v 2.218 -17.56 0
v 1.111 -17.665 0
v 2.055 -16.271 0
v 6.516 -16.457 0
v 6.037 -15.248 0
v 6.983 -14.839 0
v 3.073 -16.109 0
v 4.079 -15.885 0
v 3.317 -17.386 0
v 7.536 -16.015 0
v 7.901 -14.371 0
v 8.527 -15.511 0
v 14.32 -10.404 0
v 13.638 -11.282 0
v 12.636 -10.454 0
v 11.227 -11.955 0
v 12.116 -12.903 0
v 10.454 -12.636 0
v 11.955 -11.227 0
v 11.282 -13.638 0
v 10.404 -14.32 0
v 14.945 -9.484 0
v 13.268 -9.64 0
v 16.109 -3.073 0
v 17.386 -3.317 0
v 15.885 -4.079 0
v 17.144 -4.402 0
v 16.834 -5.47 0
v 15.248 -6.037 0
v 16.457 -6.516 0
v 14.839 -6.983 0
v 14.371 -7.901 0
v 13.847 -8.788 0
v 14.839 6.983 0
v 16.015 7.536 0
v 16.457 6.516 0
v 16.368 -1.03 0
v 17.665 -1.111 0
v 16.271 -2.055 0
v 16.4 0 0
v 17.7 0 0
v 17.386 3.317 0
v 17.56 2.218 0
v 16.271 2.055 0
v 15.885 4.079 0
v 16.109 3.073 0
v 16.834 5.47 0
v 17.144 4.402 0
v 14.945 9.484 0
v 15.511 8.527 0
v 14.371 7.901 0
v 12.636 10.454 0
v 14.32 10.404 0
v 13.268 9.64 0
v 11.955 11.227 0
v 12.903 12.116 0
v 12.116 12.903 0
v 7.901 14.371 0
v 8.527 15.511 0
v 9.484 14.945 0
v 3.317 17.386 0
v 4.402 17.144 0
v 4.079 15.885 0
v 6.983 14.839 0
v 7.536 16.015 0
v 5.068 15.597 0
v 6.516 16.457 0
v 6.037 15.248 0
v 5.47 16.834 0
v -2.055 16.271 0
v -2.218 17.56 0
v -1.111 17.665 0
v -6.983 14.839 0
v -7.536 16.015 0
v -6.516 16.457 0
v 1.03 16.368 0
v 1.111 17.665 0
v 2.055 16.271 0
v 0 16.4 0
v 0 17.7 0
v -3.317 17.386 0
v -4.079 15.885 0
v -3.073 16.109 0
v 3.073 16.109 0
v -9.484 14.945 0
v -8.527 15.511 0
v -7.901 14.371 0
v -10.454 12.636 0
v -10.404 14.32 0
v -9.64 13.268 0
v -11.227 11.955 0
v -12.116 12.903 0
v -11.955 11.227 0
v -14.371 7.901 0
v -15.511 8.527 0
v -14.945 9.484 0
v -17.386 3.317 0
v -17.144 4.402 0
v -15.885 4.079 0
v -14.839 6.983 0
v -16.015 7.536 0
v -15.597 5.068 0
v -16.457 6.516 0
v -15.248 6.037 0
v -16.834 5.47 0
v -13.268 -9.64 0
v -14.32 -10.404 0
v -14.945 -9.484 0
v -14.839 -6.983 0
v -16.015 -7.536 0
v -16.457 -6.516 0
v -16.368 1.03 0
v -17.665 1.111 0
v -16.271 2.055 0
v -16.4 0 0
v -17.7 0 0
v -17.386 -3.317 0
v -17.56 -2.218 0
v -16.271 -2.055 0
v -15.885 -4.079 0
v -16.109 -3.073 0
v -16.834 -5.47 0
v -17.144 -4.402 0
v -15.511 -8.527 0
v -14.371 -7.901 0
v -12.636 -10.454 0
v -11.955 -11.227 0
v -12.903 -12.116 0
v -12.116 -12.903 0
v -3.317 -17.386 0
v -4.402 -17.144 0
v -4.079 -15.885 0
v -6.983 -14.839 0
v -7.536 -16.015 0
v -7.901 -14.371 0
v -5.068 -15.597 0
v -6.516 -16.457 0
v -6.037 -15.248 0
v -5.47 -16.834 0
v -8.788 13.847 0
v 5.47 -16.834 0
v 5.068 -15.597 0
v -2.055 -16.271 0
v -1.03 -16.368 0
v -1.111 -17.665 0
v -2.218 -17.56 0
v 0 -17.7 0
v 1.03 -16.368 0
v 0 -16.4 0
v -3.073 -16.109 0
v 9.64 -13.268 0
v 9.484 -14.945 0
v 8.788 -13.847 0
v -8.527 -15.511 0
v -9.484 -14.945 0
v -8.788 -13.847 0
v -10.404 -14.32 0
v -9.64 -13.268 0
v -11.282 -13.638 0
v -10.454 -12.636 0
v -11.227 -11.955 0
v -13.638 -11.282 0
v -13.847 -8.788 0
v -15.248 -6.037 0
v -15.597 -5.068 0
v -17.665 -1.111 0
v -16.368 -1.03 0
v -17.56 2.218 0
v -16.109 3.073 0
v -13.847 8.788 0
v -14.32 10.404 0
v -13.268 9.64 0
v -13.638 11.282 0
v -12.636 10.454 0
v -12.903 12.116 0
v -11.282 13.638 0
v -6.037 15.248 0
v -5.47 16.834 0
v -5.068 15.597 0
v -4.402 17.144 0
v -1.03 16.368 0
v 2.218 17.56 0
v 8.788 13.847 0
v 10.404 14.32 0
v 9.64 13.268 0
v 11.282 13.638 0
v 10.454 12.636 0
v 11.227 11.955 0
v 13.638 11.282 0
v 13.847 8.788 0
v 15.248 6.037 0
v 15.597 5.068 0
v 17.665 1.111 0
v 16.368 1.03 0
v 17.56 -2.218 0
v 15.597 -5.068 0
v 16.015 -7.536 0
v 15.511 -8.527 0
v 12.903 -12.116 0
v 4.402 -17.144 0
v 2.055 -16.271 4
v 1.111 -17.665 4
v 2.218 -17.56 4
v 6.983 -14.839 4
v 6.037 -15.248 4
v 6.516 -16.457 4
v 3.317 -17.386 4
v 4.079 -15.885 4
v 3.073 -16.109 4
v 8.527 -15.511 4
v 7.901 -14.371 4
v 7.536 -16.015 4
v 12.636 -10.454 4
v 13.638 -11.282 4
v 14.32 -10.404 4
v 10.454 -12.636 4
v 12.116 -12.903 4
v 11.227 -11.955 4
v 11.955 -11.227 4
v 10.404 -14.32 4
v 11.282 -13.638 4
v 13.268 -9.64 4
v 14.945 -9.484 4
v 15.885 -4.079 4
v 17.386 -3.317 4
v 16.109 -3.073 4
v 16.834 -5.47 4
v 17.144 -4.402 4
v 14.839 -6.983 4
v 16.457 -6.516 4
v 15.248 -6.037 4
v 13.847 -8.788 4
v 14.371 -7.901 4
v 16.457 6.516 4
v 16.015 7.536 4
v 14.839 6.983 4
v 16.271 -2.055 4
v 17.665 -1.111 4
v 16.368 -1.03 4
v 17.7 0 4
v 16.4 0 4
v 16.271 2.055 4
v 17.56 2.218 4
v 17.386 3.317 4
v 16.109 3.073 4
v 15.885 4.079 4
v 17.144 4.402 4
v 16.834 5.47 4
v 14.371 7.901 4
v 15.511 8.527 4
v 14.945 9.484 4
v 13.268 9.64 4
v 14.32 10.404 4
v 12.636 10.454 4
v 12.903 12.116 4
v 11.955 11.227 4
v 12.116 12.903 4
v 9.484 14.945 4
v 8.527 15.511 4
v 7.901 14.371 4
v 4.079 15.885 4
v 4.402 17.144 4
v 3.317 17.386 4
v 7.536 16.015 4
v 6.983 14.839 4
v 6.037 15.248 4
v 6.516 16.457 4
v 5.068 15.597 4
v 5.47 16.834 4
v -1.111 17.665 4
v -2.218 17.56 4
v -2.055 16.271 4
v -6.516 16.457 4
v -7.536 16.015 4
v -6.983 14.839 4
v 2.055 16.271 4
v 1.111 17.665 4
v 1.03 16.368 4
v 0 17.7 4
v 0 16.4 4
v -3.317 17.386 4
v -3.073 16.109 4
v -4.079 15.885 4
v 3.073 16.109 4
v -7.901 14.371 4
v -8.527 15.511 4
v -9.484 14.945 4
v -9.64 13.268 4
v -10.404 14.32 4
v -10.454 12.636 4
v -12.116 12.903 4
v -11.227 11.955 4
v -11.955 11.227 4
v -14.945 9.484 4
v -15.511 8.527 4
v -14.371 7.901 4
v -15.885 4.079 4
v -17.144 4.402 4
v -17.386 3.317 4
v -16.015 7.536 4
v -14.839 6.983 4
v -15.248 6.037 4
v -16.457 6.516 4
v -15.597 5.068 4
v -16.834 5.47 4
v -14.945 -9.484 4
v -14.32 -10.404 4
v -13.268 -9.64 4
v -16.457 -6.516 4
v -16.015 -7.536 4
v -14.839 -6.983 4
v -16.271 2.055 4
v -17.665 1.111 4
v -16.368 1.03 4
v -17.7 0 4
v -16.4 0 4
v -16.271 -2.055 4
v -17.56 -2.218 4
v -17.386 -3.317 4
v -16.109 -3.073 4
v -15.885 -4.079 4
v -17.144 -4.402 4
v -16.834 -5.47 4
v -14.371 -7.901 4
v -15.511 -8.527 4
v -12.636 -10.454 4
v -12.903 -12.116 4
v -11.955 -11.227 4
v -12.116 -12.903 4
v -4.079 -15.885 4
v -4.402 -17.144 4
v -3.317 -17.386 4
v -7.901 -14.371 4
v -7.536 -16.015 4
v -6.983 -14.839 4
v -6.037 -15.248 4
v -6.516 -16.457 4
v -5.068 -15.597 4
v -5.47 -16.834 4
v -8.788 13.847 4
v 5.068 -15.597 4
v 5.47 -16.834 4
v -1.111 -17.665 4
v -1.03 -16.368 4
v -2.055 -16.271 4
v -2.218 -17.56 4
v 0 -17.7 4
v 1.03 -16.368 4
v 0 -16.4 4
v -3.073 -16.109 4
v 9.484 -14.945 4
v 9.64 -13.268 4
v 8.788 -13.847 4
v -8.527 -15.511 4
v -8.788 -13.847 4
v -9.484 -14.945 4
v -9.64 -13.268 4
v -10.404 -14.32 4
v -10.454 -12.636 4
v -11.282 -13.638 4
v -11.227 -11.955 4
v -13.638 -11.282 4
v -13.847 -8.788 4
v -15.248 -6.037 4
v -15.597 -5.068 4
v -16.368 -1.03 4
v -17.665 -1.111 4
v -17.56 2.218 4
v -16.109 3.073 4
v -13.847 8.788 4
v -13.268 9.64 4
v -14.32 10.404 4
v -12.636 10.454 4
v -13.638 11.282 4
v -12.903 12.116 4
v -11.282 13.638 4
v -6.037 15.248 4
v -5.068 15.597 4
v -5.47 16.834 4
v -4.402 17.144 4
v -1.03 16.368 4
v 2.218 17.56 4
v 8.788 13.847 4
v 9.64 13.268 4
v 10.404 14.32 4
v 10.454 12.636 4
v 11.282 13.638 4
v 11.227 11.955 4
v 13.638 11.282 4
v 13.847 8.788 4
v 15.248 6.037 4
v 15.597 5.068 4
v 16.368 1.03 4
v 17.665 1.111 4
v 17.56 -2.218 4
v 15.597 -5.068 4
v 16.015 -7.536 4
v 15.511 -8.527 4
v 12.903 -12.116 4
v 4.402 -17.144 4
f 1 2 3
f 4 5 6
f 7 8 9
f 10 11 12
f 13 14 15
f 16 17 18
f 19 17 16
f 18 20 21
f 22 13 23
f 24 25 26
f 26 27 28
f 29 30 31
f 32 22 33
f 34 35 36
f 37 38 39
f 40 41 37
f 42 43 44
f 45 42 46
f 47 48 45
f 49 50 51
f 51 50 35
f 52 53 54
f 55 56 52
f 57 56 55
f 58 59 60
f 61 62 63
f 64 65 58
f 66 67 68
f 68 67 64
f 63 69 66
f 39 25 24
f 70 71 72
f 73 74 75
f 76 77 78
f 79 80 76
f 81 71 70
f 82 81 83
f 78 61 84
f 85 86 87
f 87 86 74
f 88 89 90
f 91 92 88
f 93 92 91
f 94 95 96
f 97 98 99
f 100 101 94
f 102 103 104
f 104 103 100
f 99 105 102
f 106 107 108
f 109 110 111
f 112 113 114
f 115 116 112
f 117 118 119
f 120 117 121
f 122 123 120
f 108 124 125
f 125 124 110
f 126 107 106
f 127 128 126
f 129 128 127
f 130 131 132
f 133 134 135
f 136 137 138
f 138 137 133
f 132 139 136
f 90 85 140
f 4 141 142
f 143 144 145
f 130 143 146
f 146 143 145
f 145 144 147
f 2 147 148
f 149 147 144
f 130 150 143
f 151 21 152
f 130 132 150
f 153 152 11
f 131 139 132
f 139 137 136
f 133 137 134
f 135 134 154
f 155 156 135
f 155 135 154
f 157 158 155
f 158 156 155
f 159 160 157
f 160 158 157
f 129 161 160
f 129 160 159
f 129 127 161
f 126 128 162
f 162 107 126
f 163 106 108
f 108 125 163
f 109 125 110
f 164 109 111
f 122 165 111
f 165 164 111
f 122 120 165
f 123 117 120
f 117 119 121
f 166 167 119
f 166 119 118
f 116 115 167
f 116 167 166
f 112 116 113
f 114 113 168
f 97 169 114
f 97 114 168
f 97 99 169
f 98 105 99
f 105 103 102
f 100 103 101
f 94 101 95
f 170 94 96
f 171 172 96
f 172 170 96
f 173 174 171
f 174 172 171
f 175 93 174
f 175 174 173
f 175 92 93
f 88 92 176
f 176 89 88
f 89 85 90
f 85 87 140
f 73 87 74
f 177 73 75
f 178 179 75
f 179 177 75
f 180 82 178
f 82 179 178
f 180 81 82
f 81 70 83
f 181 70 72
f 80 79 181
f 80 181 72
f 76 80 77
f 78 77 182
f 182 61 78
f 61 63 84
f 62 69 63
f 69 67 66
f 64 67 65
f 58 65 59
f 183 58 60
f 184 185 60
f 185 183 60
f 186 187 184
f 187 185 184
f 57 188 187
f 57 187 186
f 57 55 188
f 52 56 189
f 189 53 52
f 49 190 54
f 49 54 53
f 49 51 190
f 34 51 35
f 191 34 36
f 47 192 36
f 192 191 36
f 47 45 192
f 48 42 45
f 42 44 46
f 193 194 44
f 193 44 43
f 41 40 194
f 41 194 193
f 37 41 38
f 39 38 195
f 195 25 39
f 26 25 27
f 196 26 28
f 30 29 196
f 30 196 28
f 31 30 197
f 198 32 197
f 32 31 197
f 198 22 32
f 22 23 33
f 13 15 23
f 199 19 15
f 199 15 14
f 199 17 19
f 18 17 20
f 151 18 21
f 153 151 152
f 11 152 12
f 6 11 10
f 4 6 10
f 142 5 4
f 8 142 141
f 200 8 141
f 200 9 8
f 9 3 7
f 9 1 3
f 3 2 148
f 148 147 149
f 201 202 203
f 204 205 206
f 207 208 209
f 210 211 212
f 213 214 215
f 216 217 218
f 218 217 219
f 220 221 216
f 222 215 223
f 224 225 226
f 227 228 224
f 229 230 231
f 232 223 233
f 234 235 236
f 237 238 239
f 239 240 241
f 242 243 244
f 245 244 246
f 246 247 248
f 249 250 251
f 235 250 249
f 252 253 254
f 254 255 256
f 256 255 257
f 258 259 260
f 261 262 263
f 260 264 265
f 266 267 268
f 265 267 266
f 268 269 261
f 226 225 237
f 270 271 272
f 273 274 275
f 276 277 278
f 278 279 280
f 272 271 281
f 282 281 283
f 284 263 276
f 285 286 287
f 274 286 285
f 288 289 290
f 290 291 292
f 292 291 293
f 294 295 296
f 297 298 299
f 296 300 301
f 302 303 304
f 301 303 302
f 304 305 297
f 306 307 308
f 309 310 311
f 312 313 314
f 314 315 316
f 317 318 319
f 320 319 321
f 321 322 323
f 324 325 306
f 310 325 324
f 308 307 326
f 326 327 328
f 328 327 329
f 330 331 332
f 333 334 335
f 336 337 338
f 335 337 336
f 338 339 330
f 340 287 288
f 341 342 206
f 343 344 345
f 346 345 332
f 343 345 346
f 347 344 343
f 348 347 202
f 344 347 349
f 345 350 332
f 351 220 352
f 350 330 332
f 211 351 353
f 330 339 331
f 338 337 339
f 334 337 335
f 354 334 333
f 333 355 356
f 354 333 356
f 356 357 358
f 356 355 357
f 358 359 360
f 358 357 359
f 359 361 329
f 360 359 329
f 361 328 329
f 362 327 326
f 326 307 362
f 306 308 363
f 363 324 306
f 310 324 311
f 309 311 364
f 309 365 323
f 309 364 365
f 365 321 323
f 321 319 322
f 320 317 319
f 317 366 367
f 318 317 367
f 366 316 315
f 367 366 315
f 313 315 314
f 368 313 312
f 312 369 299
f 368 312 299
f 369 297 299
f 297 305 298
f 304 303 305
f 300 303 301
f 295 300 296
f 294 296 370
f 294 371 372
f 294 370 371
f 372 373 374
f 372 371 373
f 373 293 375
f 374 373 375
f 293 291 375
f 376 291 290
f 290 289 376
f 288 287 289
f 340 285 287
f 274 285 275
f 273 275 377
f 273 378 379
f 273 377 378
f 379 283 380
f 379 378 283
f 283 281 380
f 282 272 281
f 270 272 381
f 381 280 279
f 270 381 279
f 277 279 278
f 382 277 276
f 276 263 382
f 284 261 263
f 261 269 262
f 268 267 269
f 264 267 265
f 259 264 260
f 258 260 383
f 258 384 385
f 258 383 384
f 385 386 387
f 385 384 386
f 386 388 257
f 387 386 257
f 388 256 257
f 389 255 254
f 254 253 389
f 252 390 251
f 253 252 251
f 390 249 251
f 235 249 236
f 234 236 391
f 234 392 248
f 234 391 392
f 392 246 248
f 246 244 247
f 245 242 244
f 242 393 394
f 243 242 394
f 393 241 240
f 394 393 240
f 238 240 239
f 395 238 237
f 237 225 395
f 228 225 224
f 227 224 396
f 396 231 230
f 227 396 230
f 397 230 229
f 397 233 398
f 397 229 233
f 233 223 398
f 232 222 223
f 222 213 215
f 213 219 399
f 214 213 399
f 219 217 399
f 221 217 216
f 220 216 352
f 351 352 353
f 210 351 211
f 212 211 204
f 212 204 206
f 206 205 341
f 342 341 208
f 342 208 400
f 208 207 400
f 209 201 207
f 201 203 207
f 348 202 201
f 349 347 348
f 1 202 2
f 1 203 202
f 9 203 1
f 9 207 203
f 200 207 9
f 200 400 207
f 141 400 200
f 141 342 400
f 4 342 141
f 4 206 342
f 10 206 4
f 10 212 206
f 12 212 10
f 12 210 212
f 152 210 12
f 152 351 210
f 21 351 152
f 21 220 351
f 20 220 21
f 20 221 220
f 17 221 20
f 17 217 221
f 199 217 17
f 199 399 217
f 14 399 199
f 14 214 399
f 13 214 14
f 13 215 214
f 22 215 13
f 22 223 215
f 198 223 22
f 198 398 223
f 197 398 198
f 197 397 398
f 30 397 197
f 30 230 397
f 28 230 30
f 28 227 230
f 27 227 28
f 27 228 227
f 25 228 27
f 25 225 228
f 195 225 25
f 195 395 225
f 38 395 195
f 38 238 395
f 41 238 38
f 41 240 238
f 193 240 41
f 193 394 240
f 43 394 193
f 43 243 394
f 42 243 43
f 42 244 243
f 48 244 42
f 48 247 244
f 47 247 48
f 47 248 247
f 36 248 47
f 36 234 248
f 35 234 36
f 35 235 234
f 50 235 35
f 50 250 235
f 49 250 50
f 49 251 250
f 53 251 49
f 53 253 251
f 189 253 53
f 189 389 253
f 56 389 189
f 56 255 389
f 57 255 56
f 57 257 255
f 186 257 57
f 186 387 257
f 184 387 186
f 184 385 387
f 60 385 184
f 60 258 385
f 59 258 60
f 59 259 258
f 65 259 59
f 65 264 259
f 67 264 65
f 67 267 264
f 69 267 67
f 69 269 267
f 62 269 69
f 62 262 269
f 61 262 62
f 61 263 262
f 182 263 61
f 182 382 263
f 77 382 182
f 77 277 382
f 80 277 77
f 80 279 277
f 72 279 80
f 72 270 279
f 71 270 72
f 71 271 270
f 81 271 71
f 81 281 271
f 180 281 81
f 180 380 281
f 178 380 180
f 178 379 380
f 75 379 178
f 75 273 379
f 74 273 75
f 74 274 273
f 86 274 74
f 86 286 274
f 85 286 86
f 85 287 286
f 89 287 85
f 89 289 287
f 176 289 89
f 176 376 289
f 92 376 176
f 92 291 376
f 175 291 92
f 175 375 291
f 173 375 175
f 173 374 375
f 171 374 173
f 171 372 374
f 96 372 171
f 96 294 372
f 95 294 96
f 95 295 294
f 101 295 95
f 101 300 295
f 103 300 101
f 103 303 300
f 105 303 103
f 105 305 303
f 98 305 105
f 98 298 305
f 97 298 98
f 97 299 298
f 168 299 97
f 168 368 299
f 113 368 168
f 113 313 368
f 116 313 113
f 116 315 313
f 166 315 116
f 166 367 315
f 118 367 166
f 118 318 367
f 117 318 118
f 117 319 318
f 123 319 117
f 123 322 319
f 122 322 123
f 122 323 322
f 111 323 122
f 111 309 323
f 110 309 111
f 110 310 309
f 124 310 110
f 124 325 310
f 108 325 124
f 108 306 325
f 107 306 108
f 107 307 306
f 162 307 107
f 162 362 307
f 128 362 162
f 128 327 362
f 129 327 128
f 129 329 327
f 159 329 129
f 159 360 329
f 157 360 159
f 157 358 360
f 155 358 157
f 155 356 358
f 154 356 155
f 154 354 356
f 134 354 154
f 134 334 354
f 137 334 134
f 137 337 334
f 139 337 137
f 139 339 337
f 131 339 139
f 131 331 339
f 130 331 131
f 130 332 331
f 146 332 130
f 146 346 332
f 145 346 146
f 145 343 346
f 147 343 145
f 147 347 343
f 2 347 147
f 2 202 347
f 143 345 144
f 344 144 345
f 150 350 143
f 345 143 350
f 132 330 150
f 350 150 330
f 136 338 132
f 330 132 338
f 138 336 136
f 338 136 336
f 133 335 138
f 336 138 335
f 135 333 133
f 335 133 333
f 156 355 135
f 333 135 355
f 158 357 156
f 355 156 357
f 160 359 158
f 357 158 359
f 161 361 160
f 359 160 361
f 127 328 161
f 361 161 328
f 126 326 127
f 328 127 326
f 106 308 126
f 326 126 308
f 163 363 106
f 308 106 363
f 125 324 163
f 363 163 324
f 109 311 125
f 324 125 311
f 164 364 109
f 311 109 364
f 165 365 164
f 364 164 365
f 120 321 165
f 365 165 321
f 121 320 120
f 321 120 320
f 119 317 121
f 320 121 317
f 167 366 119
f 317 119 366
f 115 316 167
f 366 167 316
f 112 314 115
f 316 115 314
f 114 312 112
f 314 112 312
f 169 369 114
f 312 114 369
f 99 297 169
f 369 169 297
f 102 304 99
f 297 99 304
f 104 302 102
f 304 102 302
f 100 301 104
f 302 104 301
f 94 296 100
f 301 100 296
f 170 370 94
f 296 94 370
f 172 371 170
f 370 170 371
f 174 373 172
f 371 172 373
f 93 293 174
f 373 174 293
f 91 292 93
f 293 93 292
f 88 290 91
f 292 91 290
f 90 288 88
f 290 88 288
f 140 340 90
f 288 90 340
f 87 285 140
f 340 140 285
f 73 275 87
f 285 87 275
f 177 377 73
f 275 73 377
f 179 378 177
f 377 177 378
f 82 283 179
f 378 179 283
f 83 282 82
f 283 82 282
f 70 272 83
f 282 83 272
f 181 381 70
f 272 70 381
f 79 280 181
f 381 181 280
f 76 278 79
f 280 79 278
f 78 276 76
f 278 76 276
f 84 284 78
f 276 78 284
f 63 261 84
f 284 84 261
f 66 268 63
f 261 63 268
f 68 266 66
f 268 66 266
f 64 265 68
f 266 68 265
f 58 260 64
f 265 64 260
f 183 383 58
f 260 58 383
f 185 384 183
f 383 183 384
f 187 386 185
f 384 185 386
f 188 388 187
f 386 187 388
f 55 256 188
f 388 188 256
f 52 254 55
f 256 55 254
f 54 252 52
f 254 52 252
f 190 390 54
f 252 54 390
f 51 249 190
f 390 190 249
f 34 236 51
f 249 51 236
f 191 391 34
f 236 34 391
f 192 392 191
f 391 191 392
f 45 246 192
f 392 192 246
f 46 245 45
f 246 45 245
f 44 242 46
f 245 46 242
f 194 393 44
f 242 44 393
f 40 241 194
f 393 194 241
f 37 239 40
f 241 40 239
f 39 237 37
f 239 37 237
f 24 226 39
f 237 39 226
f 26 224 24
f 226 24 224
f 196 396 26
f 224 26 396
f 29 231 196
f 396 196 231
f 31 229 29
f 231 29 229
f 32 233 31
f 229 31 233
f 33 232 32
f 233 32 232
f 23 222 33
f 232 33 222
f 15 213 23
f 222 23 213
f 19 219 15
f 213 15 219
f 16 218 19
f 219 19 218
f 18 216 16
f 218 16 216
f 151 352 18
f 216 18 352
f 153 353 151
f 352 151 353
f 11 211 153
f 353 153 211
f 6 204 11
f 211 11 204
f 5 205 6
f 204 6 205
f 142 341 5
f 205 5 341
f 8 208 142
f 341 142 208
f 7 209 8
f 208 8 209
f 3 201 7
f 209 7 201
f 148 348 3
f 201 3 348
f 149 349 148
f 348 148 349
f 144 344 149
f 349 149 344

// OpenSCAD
$fn = 100;

inner_diameter = 32.8;
outer_diameter = 35.4;
height = 4;

linear_extrude(height = height) difference() {
  circle(d = outer_diameter);
  circle(d = inner_diameter);
}
